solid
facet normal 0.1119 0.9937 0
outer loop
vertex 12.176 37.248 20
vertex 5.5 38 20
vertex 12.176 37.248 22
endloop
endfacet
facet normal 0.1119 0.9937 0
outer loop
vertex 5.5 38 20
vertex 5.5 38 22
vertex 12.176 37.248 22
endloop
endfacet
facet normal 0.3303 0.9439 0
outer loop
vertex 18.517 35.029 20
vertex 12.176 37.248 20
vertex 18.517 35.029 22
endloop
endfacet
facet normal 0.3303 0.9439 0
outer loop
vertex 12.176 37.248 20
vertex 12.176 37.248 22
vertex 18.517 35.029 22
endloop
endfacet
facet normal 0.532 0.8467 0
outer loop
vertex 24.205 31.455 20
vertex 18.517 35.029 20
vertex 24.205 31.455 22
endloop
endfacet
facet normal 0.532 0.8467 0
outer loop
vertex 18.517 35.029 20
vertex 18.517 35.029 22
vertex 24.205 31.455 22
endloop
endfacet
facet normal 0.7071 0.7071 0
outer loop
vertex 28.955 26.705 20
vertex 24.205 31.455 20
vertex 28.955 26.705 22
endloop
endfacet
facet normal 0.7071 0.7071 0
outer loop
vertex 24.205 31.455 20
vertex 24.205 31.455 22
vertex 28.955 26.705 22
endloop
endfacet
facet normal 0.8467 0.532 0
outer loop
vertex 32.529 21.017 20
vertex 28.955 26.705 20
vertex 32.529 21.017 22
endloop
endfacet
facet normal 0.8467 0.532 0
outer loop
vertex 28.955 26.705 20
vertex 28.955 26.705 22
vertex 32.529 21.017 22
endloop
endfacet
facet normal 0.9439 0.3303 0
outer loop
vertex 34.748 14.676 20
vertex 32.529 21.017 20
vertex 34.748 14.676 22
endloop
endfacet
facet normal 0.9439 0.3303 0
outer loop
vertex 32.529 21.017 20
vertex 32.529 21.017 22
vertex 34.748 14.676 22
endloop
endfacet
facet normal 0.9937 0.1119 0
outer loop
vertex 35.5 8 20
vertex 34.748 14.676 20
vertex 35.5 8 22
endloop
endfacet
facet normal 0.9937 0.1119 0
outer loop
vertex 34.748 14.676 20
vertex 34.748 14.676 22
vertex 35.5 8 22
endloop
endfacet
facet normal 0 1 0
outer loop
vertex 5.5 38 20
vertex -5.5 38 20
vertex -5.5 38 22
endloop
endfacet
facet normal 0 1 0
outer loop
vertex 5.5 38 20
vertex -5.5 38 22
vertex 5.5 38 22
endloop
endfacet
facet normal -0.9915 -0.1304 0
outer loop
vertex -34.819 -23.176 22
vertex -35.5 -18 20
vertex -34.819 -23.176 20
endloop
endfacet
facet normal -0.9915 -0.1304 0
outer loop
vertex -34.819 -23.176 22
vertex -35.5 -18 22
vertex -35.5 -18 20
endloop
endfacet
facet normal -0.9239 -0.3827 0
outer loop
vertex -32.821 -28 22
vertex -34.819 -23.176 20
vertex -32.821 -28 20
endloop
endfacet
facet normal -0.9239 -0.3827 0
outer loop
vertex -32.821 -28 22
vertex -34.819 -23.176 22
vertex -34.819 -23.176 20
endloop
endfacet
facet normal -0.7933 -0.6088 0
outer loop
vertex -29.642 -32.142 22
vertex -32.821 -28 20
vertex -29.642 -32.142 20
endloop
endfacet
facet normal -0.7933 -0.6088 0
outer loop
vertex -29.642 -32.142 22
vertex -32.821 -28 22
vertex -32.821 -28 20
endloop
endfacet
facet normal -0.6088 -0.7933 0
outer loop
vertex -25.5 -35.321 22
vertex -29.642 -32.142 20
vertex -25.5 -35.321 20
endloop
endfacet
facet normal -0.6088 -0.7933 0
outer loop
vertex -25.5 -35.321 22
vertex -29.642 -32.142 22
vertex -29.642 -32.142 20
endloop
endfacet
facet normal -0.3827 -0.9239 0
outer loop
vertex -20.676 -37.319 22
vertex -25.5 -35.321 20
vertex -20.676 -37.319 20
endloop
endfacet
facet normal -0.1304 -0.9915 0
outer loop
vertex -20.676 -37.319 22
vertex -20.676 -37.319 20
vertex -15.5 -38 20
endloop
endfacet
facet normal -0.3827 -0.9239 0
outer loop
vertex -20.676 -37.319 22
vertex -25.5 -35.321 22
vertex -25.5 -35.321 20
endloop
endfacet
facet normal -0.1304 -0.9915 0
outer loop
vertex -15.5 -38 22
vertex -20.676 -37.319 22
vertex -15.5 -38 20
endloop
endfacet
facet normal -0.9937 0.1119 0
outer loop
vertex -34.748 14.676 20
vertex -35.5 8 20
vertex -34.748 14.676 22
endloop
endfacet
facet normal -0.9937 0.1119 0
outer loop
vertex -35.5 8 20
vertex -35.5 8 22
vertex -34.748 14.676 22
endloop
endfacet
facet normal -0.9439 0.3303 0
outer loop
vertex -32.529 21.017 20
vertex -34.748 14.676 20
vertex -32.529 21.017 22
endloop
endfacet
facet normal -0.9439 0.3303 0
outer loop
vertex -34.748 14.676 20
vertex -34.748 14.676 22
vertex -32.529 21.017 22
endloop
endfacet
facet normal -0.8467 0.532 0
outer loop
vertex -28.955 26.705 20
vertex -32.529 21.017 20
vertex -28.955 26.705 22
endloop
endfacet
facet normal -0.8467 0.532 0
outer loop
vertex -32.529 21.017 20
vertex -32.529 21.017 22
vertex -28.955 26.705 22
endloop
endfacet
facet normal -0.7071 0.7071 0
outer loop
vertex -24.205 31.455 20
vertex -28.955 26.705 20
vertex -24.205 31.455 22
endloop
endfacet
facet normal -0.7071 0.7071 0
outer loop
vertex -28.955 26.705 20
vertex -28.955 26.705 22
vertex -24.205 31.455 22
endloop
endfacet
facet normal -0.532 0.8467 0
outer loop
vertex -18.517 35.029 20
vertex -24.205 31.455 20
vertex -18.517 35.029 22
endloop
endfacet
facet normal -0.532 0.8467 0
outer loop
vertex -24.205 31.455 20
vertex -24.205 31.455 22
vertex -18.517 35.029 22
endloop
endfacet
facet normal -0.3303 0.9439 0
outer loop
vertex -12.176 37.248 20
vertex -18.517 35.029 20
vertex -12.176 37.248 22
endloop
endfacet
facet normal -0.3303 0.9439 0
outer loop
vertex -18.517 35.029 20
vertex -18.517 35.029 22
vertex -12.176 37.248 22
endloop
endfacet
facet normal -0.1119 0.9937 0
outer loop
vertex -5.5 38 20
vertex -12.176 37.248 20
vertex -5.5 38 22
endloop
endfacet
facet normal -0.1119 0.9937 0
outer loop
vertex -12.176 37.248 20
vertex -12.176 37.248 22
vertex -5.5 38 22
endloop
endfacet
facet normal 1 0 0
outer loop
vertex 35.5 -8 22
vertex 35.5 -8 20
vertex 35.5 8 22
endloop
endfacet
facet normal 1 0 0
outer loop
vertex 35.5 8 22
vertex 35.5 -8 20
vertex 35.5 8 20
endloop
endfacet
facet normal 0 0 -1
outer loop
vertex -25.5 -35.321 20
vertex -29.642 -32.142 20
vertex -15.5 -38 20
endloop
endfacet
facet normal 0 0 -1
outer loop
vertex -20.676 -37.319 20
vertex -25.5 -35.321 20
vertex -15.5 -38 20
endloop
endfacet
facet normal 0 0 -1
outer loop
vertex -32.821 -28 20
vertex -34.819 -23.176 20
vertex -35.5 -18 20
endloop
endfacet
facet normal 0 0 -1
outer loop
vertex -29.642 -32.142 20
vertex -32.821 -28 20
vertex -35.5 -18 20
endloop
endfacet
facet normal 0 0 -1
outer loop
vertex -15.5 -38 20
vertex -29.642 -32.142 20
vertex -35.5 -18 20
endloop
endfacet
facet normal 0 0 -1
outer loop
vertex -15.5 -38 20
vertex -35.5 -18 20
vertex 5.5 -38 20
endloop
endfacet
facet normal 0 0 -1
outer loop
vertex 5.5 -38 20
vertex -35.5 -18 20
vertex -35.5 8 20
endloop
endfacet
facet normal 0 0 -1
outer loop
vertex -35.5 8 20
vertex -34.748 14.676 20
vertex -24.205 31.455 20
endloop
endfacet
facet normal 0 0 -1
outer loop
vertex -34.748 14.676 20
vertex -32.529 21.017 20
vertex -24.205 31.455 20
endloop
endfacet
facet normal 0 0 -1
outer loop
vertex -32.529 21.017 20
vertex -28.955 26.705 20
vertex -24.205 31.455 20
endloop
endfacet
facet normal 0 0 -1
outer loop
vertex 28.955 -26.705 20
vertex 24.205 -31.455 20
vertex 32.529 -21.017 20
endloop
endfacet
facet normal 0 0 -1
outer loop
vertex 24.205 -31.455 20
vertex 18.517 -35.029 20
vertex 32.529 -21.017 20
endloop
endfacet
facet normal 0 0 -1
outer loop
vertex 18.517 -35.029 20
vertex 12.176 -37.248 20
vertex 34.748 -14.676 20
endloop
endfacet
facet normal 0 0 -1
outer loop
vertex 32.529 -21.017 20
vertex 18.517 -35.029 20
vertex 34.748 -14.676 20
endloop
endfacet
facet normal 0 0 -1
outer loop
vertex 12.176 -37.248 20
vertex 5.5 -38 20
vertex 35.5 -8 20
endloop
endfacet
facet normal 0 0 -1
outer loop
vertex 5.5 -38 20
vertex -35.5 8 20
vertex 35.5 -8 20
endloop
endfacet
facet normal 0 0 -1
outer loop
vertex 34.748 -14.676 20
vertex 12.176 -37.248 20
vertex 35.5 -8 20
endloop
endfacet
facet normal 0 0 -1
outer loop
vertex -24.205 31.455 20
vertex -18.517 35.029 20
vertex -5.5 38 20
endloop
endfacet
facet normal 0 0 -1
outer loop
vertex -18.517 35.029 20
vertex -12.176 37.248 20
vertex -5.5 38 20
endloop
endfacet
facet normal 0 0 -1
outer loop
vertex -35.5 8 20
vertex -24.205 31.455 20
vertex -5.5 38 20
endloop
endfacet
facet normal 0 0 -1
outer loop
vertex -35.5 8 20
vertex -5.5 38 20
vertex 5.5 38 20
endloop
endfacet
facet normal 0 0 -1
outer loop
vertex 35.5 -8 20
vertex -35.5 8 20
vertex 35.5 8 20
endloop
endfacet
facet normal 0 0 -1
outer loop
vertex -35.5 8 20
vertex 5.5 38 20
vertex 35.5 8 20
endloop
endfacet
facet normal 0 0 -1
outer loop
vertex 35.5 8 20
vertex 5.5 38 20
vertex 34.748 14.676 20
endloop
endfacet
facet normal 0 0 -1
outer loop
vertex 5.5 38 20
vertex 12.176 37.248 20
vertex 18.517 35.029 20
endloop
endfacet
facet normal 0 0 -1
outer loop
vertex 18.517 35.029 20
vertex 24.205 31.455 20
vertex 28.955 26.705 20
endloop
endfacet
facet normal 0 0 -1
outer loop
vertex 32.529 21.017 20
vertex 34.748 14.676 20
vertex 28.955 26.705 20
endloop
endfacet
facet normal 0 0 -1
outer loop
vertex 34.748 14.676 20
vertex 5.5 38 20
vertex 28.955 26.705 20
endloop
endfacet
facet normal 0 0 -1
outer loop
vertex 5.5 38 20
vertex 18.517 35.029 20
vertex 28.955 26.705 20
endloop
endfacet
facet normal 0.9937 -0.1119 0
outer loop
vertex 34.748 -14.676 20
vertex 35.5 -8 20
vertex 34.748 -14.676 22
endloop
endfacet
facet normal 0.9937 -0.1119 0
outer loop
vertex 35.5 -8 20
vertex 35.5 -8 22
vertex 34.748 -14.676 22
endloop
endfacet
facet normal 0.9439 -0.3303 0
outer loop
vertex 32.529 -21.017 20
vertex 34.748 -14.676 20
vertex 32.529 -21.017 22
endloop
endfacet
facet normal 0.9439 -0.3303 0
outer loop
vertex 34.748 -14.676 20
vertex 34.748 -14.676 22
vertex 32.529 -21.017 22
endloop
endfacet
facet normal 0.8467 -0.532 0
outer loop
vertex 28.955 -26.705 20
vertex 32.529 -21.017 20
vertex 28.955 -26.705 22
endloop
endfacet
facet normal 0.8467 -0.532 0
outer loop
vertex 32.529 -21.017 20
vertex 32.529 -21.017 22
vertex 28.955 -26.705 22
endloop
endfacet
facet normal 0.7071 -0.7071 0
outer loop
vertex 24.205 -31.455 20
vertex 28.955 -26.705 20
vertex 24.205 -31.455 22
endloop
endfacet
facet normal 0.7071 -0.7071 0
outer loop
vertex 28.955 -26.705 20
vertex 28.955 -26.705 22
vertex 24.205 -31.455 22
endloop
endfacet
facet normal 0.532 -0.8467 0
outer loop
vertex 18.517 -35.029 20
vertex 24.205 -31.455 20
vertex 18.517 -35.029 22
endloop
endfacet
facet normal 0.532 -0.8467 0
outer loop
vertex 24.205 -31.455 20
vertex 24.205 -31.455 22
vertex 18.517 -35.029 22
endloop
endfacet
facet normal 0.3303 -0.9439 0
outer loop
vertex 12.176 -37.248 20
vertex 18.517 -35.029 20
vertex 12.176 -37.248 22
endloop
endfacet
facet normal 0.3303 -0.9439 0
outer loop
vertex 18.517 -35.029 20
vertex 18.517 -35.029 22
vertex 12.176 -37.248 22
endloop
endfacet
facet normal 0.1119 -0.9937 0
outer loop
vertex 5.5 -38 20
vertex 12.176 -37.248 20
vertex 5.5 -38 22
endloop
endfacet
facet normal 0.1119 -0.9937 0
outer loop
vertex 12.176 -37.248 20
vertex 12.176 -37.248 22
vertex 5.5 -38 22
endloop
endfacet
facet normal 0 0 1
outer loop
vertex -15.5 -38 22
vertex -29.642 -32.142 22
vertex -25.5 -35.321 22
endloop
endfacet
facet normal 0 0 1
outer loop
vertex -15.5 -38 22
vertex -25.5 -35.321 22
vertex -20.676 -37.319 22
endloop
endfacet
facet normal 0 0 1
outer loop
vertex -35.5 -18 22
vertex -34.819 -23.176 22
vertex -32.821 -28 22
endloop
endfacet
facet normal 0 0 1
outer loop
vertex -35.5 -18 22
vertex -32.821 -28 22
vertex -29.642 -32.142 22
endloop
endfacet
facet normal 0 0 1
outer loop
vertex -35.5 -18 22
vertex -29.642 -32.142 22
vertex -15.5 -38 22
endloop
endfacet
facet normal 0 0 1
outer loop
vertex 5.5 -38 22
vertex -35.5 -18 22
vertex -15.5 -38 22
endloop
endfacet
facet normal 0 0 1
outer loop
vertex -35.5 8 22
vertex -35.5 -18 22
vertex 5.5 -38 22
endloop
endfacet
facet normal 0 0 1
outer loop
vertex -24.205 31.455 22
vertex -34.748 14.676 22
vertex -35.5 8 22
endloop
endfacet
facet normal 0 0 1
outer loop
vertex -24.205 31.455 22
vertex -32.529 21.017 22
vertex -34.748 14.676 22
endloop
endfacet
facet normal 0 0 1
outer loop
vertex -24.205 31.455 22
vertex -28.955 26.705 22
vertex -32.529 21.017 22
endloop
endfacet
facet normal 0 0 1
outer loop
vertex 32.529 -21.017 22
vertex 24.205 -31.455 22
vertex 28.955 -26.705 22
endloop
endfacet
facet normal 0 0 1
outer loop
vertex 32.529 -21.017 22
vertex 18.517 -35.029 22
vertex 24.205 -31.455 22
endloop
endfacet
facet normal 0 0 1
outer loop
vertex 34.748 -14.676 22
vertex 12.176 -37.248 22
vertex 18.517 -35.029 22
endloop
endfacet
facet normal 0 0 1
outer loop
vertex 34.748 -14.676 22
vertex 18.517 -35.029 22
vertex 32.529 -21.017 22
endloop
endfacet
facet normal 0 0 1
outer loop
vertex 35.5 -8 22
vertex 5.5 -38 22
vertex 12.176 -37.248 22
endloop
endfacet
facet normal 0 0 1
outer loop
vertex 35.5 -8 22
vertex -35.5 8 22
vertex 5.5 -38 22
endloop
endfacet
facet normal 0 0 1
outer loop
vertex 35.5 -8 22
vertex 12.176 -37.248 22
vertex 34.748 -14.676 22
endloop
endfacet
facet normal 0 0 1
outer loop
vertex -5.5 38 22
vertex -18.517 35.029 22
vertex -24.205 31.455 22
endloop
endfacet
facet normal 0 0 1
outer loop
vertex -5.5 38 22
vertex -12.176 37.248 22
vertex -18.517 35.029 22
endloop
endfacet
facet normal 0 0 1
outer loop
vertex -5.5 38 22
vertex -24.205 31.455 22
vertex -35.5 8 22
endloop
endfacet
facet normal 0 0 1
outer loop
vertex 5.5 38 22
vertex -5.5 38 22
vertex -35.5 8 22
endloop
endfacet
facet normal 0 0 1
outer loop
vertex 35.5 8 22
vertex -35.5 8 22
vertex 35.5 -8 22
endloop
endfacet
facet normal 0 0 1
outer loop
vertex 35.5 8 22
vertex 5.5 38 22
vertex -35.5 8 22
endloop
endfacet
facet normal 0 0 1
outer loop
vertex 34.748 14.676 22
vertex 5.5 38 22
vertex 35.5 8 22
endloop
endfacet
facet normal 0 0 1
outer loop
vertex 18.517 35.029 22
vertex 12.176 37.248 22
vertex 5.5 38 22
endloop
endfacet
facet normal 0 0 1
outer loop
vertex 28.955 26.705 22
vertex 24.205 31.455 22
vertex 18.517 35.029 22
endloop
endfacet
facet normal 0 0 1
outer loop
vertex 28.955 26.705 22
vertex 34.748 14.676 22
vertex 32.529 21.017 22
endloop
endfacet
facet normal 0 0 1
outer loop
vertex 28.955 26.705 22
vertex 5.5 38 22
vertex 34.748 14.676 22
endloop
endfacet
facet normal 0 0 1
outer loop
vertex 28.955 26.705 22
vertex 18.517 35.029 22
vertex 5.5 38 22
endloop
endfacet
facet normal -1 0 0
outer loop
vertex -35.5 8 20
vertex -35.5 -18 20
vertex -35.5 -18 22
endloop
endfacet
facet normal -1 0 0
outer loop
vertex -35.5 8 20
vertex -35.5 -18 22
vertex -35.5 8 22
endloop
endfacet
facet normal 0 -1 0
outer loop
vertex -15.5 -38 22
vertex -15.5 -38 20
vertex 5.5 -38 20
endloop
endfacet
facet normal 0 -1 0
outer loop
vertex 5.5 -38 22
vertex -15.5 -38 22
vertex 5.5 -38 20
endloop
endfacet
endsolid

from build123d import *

# Parameters (mm, degrees)
BOX005_W          = 71
BOX005_H          = 76
BOX005_DEPTH      = 2
FILLET003002012_R = 20
FILLET003002013_R = 30
FILLET003002014_R = 30
FILLET003002015_R = 30


with BuildPart() as part:
    # Box005 → Box005 (new body)
    with BuildSketch(Plane(origin=(-35.5, -38, 20), x_dir=(1, 0, 0), z_dir=(0, 0, 1))):
        with Locations((35.5, 38)):
            Rectangle(BOX005_W, BOX005_H)
    extrude(amount=BOX005_DEPTH)

    # Fillet003002012
    fillet003002012_edges = [part.edges().sort_by_distance(p)[0] for p in [
        (-35.5, -38, 21),
    ]]
    fillet(fillet003002012_edges, radius=FILLET003002012_R)

    # Fillet003002013
    fillet003002013_edges = [part.edges().sort_by_distance(p)[0] for p in [
        (-35.5, 38, 21),
    ]]
    fillet(fillet003002013_edges, radius=FILLET003002013_R)

    # Fillet003002014
    fillet003002014_edges = [part.edges().sort_by_distance(p)[0] for p in [
        (35.5, 38, 21),
    ]]
    fillet(fillet003002014_edges, radius=FILLET003002014_R)

    # Fillet003002015
    fillet003002015_edges = [part.edges().sort_by_distance(p)[0] for p in [
        (35.5, -38, 21),
    ]]
    fillet(fillet003002015_edges, radius=FILLET003002015_R)


solid = part.part
